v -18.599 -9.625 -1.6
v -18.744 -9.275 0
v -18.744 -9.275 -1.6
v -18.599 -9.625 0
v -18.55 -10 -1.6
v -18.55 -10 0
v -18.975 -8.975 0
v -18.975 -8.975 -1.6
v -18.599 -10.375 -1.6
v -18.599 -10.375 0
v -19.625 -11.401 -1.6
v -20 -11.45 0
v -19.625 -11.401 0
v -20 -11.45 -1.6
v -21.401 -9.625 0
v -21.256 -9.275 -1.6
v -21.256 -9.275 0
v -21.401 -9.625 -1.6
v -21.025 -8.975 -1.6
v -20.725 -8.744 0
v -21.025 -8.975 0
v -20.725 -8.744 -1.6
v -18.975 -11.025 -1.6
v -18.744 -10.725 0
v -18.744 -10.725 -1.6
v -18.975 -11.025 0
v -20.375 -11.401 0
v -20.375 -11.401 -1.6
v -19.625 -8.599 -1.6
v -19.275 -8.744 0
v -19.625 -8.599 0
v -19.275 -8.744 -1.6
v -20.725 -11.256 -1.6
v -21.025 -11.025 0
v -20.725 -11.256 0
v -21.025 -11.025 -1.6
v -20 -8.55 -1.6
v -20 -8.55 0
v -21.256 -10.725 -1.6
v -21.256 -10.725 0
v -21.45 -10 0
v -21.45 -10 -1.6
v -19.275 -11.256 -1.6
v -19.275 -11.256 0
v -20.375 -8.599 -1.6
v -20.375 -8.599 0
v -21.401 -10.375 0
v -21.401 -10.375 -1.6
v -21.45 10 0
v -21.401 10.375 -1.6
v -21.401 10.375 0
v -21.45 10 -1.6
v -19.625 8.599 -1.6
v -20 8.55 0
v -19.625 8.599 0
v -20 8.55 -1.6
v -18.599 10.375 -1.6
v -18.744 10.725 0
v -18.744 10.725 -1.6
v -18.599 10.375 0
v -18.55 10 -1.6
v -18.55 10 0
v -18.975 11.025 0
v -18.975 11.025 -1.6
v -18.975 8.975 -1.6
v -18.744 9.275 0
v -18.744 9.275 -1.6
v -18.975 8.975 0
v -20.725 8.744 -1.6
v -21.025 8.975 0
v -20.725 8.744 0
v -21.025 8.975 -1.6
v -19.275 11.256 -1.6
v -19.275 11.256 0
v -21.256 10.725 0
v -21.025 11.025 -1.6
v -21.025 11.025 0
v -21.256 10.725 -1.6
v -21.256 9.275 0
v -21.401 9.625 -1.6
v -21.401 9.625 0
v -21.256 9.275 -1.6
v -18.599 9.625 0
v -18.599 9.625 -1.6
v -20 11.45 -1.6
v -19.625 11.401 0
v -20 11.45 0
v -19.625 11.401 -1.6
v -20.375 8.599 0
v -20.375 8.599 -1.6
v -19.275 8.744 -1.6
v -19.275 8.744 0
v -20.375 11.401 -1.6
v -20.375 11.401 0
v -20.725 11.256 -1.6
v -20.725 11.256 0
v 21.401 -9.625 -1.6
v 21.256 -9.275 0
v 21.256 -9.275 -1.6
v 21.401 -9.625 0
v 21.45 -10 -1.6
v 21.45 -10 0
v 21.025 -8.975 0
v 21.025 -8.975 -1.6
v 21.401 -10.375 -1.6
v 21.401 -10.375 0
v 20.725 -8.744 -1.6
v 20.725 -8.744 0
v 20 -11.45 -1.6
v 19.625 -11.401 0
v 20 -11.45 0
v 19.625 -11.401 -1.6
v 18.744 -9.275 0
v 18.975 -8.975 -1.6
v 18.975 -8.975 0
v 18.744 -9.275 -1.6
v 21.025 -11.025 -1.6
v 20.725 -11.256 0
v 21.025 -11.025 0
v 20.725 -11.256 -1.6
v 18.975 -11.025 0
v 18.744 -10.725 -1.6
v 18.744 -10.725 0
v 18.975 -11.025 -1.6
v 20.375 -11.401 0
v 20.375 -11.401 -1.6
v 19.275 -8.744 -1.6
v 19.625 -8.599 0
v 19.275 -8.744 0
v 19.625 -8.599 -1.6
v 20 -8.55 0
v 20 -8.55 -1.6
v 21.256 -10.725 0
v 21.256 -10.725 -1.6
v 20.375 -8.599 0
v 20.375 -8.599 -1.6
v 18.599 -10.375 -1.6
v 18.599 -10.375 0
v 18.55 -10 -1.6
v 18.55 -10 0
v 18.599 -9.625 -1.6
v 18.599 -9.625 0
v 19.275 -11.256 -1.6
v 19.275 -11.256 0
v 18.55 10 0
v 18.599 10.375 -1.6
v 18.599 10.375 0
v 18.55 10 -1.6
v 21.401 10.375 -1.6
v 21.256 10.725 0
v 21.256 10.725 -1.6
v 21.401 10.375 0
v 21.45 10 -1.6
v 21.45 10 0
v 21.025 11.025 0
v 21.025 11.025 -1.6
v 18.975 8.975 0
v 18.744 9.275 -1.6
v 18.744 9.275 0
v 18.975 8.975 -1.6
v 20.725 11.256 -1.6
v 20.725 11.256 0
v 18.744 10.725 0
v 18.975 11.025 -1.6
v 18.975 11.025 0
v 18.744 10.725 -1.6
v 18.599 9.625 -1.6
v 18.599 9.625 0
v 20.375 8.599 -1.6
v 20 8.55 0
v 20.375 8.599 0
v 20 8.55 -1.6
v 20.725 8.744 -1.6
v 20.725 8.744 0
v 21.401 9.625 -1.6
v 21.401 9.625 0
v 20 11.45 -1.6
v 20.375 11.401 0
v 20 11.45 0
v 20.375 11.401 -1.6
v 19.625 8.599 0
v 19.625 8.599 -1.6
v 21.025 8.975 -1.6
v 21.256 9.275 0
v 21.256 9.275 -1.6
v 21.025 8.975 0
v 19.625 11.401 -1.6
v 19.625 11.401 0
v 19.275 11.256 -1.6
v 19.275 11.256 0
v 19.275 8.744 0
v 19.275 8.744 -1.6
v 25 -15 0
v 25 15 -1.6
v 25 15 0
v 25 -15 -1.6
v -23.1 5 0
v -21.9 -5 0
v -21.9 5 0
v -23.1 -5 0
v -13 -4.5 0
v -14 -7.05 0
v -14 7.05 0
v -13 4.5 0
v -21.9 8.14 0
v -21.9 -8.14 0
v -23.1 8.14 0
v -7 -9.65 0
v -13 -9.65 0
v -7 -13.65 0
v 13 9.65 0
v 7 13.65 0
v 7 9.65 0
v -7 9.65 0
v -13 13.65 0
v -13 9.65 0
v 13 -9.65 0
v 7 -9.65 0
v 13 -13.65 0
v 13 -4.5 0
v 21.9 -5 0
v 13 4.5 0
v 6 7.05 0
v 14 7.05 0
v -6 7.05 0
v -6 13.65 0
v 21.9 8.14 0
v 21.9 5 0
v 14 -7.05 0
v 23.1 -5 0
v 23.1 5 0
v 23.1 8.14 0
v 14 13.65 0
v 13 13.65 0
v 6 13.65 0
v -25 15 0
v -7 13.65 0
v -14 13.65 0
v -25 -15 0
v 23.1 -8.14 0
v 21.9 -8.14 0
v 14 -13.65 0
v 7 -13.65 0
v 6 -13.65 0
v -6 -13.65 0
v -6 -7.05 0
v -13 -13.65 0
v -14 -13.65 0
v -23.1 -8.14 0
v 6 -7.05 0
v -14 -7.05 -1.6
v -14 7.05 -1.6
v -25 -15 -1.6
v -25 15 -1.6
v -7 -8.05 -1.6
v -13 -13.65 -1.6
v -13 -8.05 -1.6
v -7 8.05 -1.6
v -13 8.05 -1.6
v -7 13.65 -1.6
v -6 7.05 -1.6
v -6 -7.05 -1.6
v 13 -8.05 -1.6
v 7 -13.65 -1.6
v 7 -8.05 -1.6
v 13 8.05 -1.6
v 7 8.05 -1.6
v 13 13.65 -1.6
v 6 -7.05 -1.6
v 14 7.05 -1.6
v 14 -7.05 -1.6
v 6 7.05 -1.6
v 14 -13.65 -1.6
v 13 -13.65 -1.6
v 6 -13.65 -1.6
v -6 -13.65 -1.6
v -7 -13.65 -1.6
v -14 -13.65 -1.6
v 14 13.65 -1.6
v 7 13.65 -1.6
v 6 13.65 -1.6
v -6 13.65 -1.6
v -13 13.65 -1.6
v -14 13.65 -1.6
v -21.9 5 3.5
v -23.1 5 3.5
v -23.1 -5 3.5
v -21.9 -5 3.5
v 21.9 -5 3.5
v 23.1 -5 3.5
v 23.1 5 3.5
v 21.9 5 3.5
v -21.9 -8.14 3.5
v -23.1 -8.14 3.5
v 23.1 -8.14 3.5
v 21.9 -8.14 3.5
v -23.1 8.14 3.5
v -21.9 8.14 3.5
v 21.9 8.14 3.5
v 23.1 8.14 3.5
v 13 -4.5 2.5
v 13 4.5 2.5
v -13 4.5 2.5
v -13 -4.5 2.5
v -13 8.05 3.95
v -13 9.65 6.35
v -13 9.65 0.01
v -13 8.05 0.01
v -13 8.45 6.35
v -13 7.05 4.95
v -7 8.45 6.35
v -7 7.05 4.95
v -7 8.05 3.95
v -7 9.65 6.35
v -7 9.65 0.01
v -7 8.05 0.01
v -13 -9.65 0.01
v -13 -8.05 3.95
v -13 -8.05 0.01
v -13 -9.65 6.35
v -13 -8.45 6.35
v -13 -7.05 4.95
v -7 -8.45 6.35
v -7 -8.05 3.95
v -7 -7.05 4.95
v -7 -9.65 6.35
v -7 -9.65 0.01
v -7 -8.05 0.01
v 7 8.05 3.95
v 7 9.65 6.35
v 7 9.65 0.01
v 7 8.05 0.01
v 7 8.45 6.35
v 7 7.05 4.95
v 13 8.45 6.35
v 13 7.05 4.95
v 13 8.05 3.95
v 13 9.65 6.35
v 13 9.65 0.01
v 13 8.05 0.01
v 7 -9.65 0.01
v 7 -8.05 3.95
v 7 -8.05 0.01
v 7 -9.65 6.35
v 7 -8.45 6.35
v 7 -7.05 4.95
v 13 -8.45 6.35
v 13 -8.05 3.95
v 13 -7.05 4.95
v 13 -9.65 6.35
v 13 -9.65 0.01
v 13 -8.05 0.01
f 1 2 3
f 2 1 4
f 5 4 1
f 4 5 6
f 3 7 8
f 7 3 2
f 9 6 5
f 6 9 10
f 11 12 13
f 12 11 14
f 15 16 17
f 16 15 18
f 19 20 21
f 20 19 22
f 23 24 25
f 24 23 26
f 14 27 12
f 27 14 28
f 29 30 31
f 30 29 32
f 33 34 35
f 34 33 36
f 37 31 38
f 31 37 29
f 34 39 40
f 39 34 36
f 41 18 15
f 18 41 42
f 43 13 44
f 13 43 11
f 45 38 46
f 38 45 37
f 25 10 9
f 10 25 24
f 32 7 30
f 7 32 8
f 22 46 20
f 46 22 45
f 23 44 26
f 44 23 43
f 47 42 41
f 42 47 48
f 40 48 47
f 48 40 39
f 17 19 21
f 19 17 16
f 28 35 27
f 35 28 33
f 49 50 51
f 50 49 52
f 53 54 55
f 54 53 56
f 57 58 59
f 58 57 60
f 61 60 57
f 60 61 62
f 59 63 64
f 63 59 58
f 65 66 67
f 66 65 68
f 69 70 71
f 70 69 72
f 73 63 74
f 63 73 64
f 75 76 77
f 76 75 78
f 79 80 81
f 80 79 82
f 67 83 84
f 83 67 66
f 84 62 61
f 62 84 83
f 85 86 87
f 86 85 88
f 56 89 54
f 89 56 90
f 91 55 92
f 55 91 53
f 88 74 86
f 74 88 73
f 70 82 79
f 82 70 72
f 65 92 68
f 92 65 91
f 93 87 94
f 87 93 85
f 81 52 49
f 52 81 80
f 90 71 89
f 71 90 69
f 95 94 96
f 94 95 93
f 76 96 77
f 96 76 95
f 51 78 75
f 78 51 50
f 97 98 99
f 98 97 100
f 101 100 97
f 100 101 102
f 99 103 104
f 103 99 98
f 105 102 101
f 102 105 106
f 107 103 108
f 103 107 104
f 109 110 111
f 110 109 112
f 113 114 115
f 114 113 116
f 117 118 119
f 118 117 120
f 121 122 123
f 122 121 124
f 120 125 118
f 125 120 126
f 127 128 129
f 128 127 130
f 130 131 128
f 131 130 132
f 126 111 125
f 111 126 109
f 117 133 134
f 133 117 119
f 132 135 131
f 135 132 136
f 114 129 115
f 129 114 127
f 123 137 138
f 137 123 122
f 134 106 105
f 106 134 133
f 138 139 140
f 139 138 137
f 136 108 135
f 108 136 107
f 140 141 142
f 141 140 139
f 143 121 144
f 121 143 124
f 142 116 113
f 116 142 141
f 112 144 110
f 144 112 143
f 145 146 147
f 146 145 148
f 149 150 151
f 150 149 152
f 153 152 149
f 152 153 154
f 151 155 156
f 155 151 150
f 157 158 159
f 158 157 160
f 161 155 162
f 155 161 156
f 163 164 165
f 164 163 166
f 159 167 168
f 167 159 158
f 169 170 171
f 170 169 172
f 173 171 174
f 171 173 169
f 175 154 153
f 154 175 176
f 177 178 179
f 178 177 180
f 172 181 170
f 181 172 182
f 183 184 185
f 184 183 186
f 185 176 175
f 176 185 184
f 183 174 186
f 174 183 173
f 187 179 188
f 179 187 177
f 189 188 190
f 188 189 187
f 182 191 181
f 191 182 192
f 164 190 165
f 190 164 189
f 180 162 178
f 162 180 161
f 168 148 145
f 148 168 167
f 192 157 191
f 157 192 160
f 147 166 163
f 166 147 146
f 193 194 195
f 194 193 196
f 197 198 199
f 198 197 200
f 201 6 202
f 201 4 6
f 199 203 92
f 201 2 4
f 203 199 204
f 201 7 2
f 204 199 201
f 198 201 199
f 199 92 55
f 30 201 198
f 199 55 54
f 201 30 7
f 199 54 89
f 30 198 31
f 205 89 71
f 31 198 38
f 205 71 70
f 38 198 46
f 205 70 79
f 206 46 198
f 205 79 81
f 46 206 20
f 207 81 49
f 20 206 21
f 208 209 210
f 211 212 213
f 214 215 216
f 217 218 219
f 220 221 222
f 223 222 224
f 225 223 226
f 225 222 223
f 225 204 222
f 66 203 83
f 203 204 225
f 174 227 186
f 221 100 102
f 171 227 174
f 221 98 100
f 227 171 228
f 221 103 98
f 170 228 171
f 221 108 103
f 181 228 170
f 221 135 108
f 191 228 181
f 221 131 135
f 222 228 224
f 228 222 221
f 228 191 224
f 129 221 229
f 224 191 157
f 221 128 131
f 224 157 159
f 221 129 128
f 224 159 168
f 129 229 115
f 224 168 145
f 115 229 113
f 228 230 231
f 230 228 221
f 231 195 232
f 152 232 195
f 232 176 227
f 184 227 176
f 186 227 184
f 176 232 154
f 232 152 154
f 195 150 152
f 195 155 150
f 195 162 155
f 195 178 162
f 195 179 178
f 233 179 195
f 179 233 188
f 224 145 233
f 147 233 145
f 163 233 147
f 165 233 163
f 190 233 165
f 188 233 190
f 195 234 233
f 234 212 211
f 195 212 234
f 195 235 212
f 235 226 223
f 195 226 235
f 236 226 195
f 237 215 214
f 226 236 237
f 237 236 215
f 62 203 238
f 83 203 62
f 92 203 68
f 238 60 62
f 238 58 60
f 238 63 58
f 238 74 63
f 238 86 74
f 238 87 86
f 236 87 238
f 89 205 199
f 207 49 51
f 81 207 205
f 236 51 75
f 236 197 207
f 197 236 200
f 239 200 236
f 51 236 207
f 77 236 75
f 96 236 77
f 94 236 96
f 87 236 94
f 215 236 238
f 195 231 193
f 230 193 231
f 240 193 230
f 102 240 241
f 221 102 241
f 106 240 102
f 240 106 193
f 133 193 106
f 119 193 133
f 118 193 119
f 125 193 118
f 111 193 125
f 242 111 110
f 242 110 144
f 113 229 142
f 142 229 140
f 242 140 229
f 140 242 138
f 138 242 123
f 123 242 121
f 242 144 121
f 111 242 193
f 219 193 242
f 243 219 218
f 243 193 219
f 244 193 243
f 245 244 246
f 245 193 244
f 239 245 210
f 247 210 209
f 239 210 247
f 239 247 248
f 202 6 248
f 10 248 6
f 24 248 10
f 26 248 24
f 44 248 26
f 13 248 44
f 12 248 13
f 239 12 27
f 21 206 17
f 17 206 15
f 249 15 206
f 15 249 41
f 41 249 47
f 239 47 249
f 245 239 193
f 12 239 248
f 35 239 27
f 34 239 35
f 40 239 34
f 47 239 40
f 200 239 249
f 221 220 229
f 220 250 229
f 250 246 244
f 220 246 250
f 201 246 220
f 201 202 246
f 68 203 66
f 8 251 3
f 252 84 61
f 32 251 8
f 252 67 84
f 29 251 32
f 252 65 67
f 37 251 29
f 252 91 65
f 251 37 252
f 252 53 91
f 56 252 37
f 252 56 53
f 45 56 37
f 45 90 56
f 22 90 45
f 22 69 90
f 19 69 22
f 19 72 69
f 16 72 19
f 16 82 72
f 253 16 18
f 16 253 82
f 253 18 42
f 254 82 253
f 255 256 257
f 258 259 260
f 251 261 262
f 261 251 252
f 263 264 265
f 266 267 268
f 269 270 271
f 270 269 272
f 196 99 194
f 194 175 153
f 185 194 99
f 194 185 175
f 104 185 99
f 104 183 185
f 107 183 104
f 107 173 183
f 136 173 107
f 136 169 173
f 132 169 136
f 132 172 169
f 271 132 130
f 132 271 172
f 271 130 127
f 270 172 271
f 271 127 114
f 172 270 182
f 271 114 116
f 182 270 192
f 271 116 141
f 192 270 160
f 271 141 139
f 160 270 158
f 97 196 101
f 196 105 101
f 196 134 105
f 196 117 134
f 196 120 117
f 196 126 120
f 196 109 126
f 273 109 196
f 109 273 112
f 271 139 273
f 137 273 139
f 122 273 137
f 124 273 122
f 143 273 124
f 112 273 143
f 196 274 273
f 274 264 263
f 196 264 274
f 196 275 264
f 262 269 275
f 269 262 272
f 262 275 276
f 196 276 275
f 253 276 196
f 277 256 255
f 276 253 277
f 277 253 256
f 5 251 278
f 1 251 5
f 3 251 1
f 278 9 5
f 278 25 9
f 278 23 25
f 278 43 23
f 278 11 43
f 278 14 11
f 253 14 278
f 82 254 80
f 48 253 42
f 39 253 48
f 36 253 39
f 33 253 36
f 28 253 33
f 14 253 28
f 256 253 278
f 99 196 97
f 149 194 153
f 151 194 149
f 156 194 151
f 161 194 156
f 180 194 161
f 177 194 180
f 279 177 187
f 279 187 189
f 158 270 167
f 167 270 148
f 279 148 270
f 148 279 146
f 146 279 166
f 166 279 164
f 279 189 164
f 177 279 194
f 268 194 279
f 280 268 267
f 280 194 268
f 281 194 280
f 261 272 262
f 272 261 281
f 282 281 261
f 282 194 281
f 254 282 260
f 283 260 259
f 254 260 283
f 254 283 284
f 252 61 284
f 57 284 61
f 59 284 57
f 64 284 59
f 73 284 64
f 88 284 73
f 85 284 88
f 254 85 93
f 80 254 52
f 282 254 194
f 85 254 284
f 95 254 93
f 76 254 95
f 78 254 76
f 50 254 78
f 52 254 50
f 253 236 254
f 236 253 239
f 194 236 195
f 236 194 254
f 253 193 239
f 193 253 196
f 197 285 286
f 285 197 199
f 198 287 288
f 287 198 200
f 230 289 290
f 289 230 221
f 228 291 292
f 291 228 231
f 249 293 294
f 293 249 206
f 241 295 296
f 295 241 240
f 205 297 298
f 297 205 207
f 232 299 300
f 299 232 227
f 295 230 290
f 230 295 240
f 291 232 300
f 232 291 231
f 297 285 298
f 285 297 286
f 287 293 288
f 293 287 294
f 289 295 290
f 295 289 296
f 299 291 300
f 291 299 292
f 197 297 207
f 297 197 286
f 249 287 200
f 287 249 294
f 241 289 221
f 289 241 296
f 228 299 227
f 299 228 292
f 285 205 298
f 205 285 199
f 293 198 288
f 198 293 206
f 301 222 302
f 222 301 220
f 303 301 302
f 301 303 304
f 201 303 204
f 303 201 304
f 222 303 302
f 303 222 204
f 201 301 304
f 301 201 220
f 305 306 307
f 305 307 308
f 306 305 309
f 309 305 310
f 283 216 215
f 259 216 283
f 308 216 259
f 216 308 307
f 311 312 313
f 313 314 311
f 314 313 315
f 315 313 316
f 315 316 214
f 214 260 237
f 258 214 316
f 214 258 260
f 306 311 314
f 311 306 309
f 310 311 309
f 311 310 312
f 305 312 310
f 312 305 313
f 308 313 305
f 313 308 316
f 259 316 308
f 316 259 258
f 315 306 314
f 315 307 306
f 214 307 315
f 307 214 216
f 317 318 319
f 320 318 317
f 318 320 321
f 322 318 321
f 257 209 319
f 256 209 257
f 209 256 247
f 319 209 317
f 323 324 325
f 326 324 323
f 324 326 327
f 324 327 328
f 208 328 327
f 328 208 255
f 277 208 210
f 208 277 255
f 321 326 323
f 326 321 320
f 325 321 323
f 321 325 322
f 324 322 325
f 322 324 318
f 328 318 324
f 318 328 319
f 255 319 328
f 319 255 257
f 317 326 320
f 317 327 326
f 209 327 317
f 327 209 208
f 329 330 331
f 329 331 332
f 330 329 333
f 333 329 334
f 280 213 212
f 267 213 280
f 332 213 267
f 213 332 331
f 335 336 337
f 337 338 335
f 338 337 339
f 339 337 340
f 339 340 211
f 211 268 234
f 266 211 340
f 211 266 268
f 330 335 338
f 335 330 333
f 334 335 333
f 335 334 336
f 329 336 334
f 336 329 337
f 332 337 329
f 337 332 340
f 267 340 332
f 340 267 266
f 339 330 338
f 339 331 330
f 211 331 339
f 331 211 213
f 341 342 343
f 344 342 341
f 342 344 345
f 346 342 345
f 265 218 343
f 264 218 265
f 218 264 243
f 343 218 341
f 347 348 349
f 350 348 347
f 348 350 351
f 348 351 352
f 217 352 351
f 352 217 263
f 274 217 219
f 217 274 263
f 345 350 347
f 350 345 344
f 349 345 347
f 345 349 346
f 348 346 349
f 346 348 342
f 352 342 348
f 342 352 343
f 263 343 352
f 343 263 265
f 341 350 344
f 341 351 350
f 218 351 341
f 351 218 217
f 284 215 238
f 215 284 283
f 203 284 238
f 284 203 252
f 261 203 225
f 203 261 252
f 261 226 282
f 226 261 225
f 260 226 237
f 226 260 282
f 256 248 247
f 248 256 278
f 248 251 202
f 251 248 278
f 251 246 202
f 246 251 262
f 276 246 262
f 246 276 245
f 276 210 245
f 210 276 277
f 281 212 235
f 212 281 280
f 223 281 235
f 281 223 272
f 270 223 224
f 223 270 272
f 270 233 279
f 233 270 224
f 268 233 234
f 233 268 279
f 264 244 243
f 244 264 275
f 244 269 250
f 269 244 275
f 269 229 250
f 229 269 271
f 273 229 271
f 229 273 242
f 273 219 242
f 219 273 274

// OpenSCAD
// file: ../../screw-post/screw-post.scad
//-----------------------------------------------------------------------
// Screw post: a round post off the floor that a board screws down onto
//
// Two ways to fix:
//   "nut"  clearance hole through the post and floor; the nut sits in a hex
//          trap in the floor's underside, so the screw goes in from the top
//   "tap"  a pilot hole the screw cuts its own thread in (one or two fittings
//          in PLA/PETG); blind, the floor stays whole underneath
// and "head" for a screw up from below (head in a counterbore, nut on top).
//
// Modules, all in the same frame:
//   screwPostGhost()     the screw (and nut), for previews
//   screwPost()          the post: add to the floor
//   screwPostFloorCut()  subtract from the floor: nut trap / counterbore and hole
//
// Frame: origin on the floor top, on the post's axis. Z up; the floor is
// Z = -floorThick .. 0. Units: mm.
//
// Sizes: "M2", "M2.5", "M3". screwPostScrew(size, ...) says which screw length
// reaches, so a project can assert it has that screw in the kit.
//-----------------------------------------------------------------------

//-- [name, screw Ø, nut across flats, nut thick, head Ø, head height, tap hole, post Ø]
//-- Nuts ISO 4032; heads ISO 7380 button. Tap holes: the usual ~0.8 x Ø for plastic
screwSizes = [
  ["M2",   2.0, 4.0, 1.6, 3.5, 1.1, 1.6, 5.0],
  ["M2.5", 2.5, 5.0, 2.0, 4.4, 1.4, 2.1, 6.0],    // head 4.4: measured on the kit's M2.5 (controller base)
  ["M3",   3.0, 5.5, 2.4, 5.7, 1.65, 2.5, 7.0],
];

screwHoleClear = 0.4;     // added to the screw Ø for a clearance hole
screwNutClear  = 0.3;     // CAL: across flats, nut trap over the nut. Set by the fit piece
screwTapClear  = 0.0;     // CAL: added to the tap hole. Set by the fit piece
screwHeadClear = 0.6;     // counterbore over the head Ø

function screwSize(size) = let (i = search([size], screwSizes)[0])
  assert(i != [] && i != undef, str("unknown screw size ", size)) screwSizes[i];
function screwDia(size)    = screwSize(size)[1];
function screwNutAF(size)  = screwSize(size)[2];
function screwNutH(size)   = screwSize(size)[3];
function screwHeadDia(size)= screwSize(size)[4];
function screwHeadH(size)  = screwSize(size)[5];
function screwPostDia(size)= screwSize(size)[7];

//-- Shortest screw that fills the nut, from the top of the clamped part (h + clamp
//-- above the floor) down to the nut trap's underside. Round up to a length you have.
function screwPostScrew(size, h, floorThick, clamp = 1.6) = h + clamp + floorThick;

module screwPostGhost(size, h, floorThick, clamp = 1.6, length, how = "nut")
{
  d = screwDia(size);
  L = is_undef(length) ? screwPostScrew(size, h, floorThick, clamp) : length;
  top = h + clamp;
  if (how == "head")
  {
    %color("Silver") translate([0, 0, -floorThick]) cylinder(d = screwHeadDia(size), h = screwHeadH(size), $fn = 24);
    %color("Silver") translate([0, 0, -floorThick + screwHeadH(size)]) cylinder(d = d, h = L, $fn = 16);
  }
  else
  {
    %color("Silver") translate([0, 0, top]) cylinder(d = screwHeadDia(size), h = screwHeadH(size), $fn = 24);
    %color("Silver") translate([0, 0, top - L]) cylinder(d = d, h = L, $fn = 16);
    if (how == "nut")
      %color("DimGray") translate([0, 0, -floorThick]) rotate([0, 0, 30]) cylinder(d = screwNutAF(size)/cos(30), h = screwNutH(size), $fn = 6);
  }
}

//-- how: "nut" | "head" (through hole) or "tap" (blind pilot hole). postDia defaults by size
module screwPost(size, h, how = "nut", postDia, tapClear = screwTapClear)
{
  pd = is_undef(postDia) ? screwPostDia(size) : postDia;
  hole = how == "tap" ? screwSize(size)[6] + tapClear : screwDia(size) + screwHoleClear;
  difference()
  {
    translate([0, 0, -0.01]) cylinder(d = pd, h = h + 0.01, $fn = 40);
    translate([0, 0, how == "tap" ? 0.6 : -1]) cylinder(d = hole, h = h + 2, $fn = 24);
    //-- lead-in so the screw starts square
    translate([0, 0, h - 0.4]) cylinder(d1 = hole, d2 = hole + 0.8, h = 0.41, $fn = 24);
  }
}

//-- "nut": hex trap from the underside, opening a little over the nut so it sits flush.
//-- "head": counterbore for the head. "tap": nothing.
module screwPostFloorCut(size, floorThick, how = "nut", nutClear = screwNutClear)
{
  d = screwDia(size) + screwHoleClear;
  if (how == "nut")
  {
    af = screwNutAF(size) + nutClear;
    translate([0, 0, -floorThick - 1]) rotate([0, 0, 30]) cylinder(d = af/cos(30), h = screwNutH(size) + 0.1 + 1, $fn = 6);
    translate([0, 0, -floorThick - 1]) cylinder(d = d + 0.4, h = floorThick + 2, $fn = 24);
  }
  if (how == "head")
  {
    translate([0, 0, -floorThick - 1]) cylinder(d = screwHeadDia(size) + screwHeadClear, h = screwHeadH(size) + 0.2 + 1, $fn = 32);
    translate([0, 0, -floorThick - 1]) cylinder(d = d + 0.4, h = floorThick + 2, $fn = 24);
  }
  assert(how == "tap" || floorThick >= (how == "nut" ? screwNutH(size) : screwHeadH(size)) + 0.1 + 0.3,
         str("floor too thin for the ", size, " ", how));
}
// file: ../../board-pocket/board-pocket.scad
//-----------------------------------------------------------------------
// Board pocket: holds a board that has no mounting holes
//
// The board sits on a central pedestal with a pad of double-sided foam tape
// on top, inside a low wall that follows its outline. The pedestal keeps
// the board's edges off the floor, so lead stubs soldered through the edge
// holes have room underneath; gaps in the wall let the leads out. The wall
// only locates the board: the tape holds it down, and in a closed box a lid
// pad presses a pad of foam onto it (boardLidPad below).
//
// Modules, all in the same frame:
//   boardPocketGhost()   the board and its tape, for previews
//   boardPocketHolder()  the plastic: pedestal and outline wall, add to the floor
//   boardLidPad()        a block hanging from the lid that presses foam onto the board
//   boardLidPadGhost()   the foam under it, squashed, for previews
//
// Frame: origin on the floor top, under the centre of the board's outline.
// X along the board's length l, Y across its width w, Z up. Units: mm.
//
// Sides are listed [-X, +X, -Y, +Y], each one of
//   "gap"    wall with a gap in the middle for leads (gapW wide)
//   "solid"  whole wall: use it where the board takes a push (a plug)
//   "open"   no wall: the board's edge goes into a box wall (a USB port)
//
// Used by esp32-c3-supermini, esp32-s3-devkitc and rs485-max485.
//-----------------------------------------------------------------------

//-- From the controller project's receiver.scad / rack-end.scad (boardPocket), 2026-10-30
bpPedestal  = 2.5;     // floor to the tape: room for lead stubs under the board edges
bpTape      = 1.0;     // double-sided foam tape on the pedestal. CAL: how far it squashes
bpWall      = 1.2;     // outline wall thickness
bpRise      = 1.0;     // wall top above the PCB underside (the controller project's rack-end: 0.8 under the S3's module)
bpClearance = 0.4;     // per side, board outline to wall: PETG. 0.3 for PLA. Set by the fit piece
bpGapW      = 6;       // lead gap in a "gap" side
bpPadInset  = 4;       // default pedestal: the board less this all round

//-- Lid hold-down (the controller project's receiver / rack-end lid pads)
bpFoam      = 3.0;     // CAL: self-adhesive foam stuck under each lid pad
bpSqueeze   = 1.0;     // how far the lid squashes it: ~1/3 for soft foam, 0.3 for felt

//-- PCB underside above the floor top
function boardPocketZ(pedestal = bpPedestal, tape = bpTape) = pedestal + tape;
//-- default pedestal [l, w] for a board
function boardPocketPad(l, w, inset = bpPadInset) = [max(l - 2*inset, 4), max(w - 2*inset, 4)];
//-- Z of a lid pad's underside, pressing on a surface at surfaceZ (board top, or a part on it)
function boardLidPadZ(surfaceZ, foam = bpFoam, squeeze = bpSqueeze) =
  assert(squeeze > 0 && squeeze < foam, "foam would not touch the board")
  surfaceZ + foam - squeeze;

function bpSides4(s) = is_list(s) ? s : [s, s, s, s];

module boardPocketGhost(l, w, pcb = 1.6, pad, pedestal = bpPedestal, tape = bpTape)
{
  p = is_undef(pad) ? boardPocketPad(l, w) : pad;
  %color("White") translate([-p[0]/2, -p[1]/2, pedestal]) cube([p[0], p[1], tape]);
  %color("DarkGreen") translate([-l/2, -w/2, pedestal + tape]) cube([l, w, pcb]);
}

//-- pad: pedestal [l, w]; gapW a number or one per side
module boardPocketHolder(l, w, pad, sides = "gap", gapW = bpGapW, clearance = bpClearance,
                         pedestal = bpPedestal, tape = bpTape, wall = bpWall, rise = bpRise)
{
  p   = is_undef(pad) ? boardPocketPad(l, w) : pad;
  s   = bpSides4(sides);
  g   = bpSides4(gapW);
  ix  = l/2 + clearance;                 // inner half sizes
  iy  = w/2 + clearance;
  top = pedestal + tape + rise;
  assert(p[0] <= l && p[1] <= w, "pedestal bigger than the board");
  for (k = s) assert(k == "gap" || k == "solid" || k == "open", str("unknown side ", k));

  //-- pedestal, centred under the board
  translate([-p[0]/2, -p[1]/2, -0.01]) cube([p[0], p[1], pedestal + 0.01]);
  //-- outline wall
  difference()
  {
    translate([-ix - wall, -iy - wall, -0.01]) cube([2*(ix + wall), 2*(iy + wall), top + 0.01]);
    translate([-ix, -iy, -1]) cube([2*ix, 2*iy, top + 2]);
    for (i = [0 : 3])
    {
      //-- each side's cut, drawn for -X then turned into place
      ax = (i < 2) ? ix : iy;         // inner half size across the side
      al = (i < 2) ? iy : ix;         // half length along it
      rotate([0, 0, [0, 180, 90, 270][i]])   // -X, +X, -Y, +Y
      {
        if (s[i] == "gap")
          translate([-ax - wall - 1, -g[i]/2, -1]) cube([wall + 2, g[i], top + 2]);
        if (s[i] == "open")
          translate([-ax - wall - 1, -al - wall - 1, -1]) cube([wall + 1.01, 2*(al + wall + 1), top + 2]);
      }
    }
  }
}

//-- A lid pad over the rectangle size [x, y] centred at `at`, from the squashed foam up to
//-- lidZ (the lid's inner face in this frame), running `into` up into the lid plate
module boardLidPad(size, at = [0, 0], surfaceZ, lidZ, foam = bpFoam, squeeze = bpSqueeze, into = 0.5)
{
  z0 = boardLidPadZ(surfaceZ, foam, squeeze);
  assert(lidZ > z0, "lid is below the pad: the box is too low for the foam");
  translate([at[0] - size[0]/2, at[1] - size[1]/2, z0]) cube([size[0], size[1], lidZ - z0 + into]);
}

module boardLidPadGhost(size, at = [0, 0], surfaceZ, foam = bpFoam, squeeze = bpSqueeze)
{
  %color("Gray") translate([at[0] - size[0]/2, at[1] - size[1]/2, surfaceZ]) cube([size[0], size[1], foam - squeeze]);
}
// main file
// The module's carrier, for the catalogue: a 5 x 3 plate with the pedestal, the end walls
// and their lead gaps, and two snap hooks over each long edge on their flex-relief tongues.
// Also the plastic for the collision check. Set variant for another module in the table.
use <../rs485-max485.scad>

variant = "jzk";
tab     = false;

rs485Carrier(variant, tab);
